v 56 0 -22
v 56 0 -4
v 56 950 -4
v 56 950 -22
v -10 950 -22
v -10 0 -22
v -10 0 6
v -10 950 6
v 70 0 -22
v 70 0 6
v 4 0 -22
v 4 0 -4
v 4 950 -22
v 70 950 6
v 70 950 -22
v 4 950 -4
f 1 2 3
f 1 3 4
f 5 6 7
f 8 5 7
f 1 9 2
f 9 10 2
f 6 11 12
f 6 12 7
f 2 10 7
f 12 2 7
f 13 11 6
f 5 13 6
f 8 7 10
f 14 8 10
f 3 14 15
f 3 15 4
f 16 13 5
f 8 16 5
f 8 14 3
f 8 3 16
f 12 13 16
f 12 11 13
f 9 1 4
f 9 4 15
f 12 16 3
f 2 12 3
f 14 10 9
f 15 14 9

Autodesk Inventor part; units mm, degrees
ref_plane "YZ Plane" through (0, 0, 0) normal (1, 0, 0) x (0, 1, 0)
ref_plane "XZ Plane" through (0, 0, 0) normal (0, 1, 0) x (-1, 0, 0)
ref_plane "XY Plane" through (0, 0, 0) normal (0, 0, 1) x (1, 0, 0)
sketch "Sketch1" plane through (0, 0, 0) normal (0, 1, 0) x (-1, 0, 0)
  line L0 (10, 6) -> (-70, 6)
  line L1 (-70, 6) -> (-70, -9)
  line L2 (-70, -9) -> (10, -9)
  line L3 (10, -9) -> (10, 6)
  line L4 (-17, -9) -> (-4, -22)
  line L5 (-4, -22) -> (10, -22)
  line L6 (10, -22) -> (10, -9)
  line L7 (-43, -9) -> (-56, -22)
  line L8 (-56, -22) -> (-70, -22)
  line L9 (-70, -22) -> (-70, -9)
  line L10 (-56, -22) -> (-4, -22)
  line L11 (-4, -22) -> (-4, -4)
  line L12 (-4, -4) -> (-56, -4)
  line L13 (-56, -4) -> (-56, -22)
  point P0 (0, 0)
  point P1 (-4, -22)
  dimension "d0" = 15
  dimension "d1" = 80
extrude "Extrusion1" add sketch "Sketch1" along normal blind 950 contours L3 L2 L11 L12 L13 L1 L0 | L6 L5 L11 L2 | L2 L13 L8 L9
properties part number "L_PlNKA800" material "Aluminum 6061"
